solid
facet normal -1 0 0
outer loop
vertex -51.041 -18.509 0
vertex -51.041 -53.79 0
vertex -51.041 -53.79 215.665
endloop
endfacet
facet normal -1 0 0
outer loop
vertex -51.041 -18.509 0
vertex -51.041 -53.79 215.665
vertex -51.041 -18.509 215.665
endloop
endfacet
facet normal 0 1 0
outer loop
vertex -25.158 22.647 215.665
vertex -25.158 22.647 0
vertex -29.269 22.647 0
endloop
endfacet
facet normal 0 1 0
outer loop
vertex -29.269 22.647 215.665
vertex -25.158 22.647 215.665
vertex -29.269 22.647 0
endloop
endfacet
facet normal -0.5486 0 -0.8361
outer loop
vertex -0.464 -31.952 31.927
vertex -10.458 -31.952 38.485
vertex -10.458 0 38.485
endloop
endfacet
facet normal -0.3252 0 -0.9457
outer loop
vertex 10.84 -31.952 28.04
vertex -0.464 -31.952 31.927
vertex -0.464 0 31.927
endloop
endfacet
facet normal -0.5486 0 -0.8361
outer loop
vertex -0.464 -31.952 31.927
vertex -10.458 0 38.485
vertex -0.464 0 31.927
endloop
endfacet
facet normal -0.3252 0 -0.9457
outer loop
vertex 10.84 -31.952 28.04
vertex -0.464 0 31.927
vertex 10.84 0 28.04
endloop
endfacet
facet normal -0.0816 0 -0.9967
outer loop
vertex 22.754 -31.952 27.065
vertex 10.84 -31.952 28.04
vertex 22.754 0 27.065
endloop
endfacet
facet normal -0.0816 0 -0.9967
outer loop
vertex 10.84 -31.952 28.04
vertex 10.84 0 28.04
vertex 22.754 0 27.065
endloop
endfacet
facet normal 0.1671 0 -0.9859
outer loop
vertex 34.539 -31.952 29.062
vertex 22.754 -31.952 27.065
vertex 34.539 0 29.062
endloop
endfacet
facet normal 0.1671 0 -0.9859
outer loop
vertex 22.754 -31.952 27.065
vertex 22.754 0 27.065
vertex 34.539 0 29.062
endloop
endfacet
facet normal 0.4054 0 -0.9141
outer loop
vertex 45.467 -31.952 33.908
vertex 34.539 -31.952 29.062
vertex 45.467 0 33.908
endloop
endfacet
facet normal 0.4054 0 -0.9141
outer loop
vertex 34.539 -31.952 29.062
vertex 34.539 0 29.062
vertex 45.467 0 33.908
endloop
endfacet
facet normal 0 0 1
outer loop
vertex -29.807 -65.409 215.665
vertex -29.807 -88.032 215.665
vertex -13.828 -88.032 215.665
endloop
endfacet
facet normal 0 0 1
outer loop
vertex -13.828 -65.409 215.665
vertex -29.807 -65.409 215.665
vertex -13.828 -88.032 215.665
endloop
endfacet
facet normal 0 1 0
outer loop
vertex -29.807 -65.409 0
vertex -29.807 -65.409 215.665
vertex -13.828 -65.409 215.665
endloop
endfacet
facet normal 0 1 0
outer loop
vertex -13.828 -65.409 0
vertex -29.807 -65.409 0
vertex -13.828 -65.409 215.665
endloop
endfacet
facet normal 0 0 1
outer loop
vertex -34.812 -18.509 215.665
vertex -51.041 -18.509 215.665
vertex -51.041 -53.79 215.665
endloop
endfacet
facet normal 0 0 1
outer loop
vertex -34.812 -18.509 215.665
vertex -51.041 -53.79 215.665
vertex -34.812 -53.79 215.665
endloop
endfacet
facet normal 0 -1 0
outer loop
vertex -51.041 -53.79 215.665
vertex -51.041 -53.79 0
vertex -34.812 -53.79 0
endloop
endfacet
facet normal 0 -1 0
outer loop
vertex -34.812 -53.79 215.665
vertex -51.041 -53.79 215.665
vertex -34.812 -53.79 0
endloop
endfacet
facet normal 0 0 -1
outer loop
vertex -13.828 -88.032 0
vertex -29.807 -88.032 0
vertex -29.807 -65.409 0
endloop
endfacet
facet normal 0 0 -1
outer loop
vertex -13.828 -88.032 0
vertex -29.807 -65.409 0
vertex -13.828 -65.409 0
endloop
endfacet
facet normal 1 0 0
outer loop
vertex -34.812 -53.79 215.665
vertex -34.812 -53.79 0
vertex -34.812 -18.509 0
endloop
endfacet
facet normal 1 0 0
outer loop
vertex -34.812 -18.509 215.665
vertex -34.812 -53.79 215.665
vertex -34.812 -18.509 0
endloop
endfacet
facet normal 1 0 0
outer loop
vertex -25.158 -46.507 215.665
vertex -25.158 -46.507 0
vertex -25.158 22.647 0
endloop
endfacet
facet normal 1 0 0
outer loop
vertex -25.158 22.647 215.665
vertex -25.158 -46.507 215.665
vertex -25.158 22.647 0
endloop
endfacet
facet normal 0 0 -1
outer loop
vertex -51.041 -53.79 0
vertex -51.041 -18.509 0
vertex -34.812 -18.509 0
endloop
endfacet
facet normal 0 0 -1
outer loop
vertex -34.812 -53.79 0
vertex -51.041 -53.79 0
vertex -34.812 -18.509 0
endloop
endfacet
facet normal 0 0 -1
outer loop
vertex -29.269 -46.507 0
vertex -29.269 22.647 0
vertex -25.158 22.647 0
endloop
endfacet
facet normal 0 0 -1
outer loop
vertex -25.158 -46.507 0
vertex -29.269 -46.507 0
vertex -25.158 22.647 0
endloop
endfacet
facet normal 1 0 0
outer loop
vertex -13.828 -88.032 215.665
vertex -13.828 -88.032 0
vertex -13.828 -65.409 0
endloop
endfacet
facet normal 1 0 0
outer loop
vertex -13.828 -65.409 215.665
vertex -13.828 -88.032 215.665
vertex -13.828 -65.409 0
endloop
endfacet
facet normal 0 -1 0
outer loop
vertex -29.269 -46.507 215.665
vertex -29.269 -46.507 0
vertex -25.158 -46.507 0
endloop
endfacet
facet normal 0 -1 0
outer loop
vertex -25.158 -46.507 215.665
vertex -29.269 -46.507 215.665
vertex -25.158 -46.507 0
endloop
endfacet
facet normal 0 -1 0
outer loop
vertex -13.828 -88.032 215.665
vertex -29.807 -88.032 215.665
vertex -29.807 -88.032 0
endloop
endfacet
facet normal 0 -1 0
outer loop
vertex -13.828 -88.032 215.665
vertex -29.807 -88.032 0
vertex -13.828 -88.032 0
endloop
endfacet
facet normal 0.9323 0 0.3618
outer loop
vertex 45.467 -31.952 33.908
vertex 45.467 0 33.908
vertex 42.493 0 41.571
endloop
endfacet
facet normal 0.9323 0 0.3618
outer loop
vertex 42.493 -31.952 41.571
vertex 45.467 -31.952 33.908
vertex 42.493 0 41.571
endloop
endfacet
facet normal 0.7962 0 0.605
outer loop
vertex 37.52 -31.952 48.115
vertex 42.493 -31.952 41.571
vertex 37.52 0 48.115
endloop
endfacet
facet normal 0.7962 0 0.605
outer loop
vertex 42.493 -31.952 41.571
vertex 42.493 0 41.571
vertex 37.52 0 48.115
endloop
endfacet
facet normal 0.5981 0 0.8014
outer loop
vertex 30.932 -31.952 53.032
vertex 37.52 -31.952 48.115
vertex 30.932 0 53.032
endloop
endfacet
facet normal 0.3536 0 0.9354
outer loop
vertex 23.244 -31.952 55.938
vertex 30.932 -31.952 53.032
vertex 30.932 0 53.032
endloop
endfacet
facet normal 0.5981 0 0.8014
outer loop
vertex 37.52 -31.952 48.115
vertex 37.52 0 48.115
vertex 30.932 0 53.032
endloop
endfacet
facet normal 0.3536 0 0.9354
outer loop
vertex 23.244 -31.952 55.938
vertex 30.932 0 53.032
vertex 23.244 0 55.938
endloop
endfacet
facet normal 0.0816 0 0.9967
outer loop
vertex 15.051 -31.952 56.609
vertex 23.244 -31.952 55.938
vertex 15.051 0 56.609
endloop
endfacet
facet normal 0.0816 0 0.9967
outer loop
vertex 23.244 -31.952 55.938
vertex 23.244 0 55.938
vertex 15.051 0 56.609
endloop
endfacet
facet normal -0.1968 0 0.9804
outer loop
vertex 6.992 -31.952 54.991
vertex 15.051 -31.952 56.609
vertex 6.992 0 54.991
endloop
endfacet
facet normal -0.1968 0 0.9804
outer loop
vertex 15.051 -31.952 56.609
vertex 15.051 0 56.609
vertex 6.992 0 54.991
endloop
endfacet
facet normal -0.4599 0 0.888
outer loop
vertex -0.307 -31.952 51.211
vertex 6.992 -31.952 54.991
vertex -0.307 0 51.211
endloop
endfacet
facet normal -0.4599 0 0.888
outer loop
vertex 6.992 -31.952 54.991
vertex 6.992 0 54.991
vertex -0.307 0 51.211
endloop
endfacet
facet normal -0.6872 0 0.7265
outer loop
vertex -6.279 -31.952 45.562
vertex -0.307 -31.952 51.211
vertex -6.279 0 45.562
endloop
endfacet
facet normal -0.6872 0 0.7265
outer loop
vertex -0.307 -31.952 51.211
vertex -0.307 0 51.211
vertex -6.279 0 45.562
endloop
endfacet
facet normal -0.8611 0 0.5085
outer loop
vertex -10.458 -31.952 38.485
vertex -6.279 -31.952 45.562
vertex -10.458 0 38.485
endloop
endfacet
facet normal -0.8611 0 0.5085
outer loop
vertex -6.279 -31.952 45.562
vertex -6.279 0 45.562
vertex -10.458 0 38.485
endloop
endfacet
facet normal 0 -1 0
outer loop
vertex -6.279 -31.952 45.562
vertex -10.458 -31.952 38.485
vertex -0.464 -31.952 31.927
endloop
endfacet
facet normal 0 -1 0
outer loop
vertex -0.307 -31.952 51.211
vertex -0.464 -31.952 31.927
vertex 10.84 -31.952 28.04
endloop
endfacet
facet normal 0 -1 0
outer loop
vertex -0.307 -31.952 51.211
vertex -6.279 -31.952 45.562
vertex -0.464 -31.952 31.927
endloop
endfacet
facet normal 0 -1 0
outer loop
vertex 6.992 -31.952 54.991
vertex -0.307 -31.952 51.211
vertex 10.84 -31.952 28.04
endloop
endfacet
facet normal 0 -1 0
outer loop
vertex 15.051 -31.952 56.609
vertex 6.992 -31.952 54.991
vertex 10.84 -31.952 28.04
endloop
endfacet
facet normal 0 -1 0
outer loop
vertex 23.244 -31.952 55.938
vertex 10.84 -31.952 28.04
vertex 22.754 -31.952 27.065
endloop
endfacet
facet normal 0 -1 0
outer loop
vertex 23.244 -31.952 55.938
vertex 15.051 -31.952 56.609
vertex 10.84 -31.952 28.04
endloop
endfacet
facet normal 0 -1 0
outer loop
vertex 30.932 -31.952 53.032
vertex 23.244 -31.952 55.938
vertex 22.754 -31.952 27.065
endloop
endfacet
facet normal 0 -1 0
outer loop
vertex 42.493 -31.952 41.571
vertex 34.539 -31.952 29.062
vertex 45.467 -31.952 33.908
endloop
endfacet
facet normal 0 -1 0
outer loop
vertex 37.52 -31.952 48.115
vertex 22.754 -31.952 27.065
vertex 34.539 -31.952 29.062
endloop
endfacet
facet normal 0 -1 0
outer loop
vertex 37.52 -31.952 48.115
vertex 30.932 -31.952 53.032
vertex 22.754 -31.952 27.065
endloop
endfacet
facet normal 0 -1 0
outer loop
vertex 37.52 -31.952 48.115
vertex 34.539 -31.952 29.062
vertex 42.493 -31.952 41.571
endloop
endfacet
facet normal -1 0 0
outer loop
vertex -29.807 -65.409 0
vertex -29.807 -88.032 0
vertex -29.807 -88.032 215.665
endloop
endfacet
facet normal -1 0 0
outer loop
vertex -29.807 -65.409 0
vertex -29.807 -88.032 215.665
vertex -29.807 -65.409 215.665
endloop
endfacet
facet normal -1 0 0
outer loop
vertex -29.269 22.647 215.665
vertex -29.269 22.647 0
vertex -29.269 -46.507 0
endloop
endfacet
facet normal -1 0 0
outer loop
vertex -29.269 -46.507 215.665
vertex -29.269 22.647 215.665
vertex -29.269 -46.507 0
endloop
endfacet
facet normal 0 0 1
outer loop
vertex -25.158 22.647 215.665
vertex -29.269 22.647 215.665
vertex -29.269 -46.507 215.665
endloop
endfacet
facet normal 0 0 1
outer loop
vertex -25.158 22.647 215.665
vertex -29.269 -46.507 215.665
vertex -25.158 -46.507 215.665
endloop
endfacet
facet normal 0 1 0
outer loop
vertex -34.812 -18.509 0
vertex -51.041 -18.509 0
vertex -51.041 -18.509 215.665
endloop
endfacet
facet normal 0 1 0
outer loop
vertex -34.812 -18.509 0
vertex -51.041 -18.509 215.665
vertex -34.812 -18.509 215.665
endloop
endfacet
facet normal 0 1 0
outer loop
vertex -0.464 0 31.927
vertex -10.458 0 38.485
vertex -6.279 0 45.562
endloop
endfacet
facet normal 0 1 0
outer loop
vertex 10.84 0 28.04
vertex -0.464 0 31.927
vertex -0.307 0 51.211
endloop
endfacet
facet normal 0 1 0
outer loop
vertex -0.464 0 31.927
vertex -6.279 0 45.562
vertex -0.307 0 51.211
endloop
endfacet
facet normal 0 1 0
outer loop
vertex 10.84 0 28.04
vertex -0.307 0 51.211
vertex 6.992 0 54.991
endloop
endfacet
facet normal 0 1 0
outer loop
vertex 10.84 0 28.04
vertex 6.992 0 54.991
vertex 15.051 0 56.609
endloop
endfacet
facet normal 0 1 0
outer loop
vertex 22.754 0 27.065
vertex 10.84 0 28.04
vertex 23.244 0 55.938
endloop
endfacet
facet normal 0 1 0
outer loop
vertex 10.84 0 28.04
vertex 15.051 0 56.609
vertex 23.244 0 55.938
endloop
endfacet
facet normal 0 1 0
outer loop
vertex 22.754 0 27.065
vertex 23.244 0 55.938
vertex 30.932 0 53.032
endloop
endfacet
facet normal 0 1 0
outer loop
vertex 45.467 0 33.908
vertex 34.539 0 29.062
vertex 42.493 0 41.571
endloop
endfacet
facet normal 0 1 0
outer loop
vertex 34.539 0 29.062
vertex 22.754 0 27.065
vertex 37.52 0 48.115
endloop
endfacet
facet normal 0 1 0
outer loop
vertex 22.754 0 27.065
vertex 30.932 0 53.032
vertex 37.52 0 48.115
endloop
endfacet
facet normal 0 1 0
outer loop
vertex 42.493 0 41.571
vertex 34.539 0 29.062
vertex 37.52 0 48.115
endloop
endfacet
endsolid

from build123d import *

# Parameters (mm, degrees)
F1_DEPTH = 31.9517180324
F2_W     = 16.2296146154
F2_H     = 35.2809950709
F3_DEPTH = 215.6650107354
F2_W_2   = 1.59111619
F2_H_2   = 0.5565434694
F2_W_3   = 15.9789174795
F2_H_3   = 22.6231738925


with BuildPart() as f1:
    # F0 (on Front) → F1 (new body)
    with BuildSketch(Plane.XZ):
        with BuildLine():
            ThreePointArc((45.4666044703, 33.9075185045), (19.1708433519, 56.5603457269), (-10.4582310831, 38.4845170573))
            ThreePointArc((-10.4582310831, 38.4845170573), (16.7663369063, 27.1804746164), (45.4666044703, 33.9075185045))
        make_face()
    extrude(amount=F1_DEPTH)


with BuildPart() as f3:
    # F2 (on Top) → F3 (new body)
    with BuildSketch(Plane.XY):
        with Locations((-42.9266318679, -36.1494235694)):
            Rectangle(F2_W, F2_H)
    extrude(amount=F3_DEPTH)


with BuildPart() as f3b:
    # F2 (on Top) → F3, piece 2 (new body)
    with BuildSketch(Plane.XY):
        with Locations((-25.9531736374, 9.9924132228)):
            Rectangle(F2_W_2, F2_H_2)
        Polygon((-25.1576155424, 9.7141414881), (-26.7487317324, 9.7141414881), (-26.7487317324, 10.2706849575), (-25.1576155424, 10.2706849575), (-25.1576155424, 22.6467847824), (-29.2692780495, 22.6467847824), (-29.2692780495, -46.5068370104), (-25.1576155424, -46.5068370104), align=None)
    extrude(amount=F3_DEPTH)


with BuildPart() as f3c:
    # F2 (on Top) → F3, piece 3 (new body)
    with BuildSketch(Plane.XY):
        with Locations((-21.8176469207, -76.7201073468)):
            Rectangle(F2_W_3, F2_H_3)
    extrude(amount=F3_DEPTH)


solid = Compound([f1.part, f3.part, f3b.part, f3c.part])
